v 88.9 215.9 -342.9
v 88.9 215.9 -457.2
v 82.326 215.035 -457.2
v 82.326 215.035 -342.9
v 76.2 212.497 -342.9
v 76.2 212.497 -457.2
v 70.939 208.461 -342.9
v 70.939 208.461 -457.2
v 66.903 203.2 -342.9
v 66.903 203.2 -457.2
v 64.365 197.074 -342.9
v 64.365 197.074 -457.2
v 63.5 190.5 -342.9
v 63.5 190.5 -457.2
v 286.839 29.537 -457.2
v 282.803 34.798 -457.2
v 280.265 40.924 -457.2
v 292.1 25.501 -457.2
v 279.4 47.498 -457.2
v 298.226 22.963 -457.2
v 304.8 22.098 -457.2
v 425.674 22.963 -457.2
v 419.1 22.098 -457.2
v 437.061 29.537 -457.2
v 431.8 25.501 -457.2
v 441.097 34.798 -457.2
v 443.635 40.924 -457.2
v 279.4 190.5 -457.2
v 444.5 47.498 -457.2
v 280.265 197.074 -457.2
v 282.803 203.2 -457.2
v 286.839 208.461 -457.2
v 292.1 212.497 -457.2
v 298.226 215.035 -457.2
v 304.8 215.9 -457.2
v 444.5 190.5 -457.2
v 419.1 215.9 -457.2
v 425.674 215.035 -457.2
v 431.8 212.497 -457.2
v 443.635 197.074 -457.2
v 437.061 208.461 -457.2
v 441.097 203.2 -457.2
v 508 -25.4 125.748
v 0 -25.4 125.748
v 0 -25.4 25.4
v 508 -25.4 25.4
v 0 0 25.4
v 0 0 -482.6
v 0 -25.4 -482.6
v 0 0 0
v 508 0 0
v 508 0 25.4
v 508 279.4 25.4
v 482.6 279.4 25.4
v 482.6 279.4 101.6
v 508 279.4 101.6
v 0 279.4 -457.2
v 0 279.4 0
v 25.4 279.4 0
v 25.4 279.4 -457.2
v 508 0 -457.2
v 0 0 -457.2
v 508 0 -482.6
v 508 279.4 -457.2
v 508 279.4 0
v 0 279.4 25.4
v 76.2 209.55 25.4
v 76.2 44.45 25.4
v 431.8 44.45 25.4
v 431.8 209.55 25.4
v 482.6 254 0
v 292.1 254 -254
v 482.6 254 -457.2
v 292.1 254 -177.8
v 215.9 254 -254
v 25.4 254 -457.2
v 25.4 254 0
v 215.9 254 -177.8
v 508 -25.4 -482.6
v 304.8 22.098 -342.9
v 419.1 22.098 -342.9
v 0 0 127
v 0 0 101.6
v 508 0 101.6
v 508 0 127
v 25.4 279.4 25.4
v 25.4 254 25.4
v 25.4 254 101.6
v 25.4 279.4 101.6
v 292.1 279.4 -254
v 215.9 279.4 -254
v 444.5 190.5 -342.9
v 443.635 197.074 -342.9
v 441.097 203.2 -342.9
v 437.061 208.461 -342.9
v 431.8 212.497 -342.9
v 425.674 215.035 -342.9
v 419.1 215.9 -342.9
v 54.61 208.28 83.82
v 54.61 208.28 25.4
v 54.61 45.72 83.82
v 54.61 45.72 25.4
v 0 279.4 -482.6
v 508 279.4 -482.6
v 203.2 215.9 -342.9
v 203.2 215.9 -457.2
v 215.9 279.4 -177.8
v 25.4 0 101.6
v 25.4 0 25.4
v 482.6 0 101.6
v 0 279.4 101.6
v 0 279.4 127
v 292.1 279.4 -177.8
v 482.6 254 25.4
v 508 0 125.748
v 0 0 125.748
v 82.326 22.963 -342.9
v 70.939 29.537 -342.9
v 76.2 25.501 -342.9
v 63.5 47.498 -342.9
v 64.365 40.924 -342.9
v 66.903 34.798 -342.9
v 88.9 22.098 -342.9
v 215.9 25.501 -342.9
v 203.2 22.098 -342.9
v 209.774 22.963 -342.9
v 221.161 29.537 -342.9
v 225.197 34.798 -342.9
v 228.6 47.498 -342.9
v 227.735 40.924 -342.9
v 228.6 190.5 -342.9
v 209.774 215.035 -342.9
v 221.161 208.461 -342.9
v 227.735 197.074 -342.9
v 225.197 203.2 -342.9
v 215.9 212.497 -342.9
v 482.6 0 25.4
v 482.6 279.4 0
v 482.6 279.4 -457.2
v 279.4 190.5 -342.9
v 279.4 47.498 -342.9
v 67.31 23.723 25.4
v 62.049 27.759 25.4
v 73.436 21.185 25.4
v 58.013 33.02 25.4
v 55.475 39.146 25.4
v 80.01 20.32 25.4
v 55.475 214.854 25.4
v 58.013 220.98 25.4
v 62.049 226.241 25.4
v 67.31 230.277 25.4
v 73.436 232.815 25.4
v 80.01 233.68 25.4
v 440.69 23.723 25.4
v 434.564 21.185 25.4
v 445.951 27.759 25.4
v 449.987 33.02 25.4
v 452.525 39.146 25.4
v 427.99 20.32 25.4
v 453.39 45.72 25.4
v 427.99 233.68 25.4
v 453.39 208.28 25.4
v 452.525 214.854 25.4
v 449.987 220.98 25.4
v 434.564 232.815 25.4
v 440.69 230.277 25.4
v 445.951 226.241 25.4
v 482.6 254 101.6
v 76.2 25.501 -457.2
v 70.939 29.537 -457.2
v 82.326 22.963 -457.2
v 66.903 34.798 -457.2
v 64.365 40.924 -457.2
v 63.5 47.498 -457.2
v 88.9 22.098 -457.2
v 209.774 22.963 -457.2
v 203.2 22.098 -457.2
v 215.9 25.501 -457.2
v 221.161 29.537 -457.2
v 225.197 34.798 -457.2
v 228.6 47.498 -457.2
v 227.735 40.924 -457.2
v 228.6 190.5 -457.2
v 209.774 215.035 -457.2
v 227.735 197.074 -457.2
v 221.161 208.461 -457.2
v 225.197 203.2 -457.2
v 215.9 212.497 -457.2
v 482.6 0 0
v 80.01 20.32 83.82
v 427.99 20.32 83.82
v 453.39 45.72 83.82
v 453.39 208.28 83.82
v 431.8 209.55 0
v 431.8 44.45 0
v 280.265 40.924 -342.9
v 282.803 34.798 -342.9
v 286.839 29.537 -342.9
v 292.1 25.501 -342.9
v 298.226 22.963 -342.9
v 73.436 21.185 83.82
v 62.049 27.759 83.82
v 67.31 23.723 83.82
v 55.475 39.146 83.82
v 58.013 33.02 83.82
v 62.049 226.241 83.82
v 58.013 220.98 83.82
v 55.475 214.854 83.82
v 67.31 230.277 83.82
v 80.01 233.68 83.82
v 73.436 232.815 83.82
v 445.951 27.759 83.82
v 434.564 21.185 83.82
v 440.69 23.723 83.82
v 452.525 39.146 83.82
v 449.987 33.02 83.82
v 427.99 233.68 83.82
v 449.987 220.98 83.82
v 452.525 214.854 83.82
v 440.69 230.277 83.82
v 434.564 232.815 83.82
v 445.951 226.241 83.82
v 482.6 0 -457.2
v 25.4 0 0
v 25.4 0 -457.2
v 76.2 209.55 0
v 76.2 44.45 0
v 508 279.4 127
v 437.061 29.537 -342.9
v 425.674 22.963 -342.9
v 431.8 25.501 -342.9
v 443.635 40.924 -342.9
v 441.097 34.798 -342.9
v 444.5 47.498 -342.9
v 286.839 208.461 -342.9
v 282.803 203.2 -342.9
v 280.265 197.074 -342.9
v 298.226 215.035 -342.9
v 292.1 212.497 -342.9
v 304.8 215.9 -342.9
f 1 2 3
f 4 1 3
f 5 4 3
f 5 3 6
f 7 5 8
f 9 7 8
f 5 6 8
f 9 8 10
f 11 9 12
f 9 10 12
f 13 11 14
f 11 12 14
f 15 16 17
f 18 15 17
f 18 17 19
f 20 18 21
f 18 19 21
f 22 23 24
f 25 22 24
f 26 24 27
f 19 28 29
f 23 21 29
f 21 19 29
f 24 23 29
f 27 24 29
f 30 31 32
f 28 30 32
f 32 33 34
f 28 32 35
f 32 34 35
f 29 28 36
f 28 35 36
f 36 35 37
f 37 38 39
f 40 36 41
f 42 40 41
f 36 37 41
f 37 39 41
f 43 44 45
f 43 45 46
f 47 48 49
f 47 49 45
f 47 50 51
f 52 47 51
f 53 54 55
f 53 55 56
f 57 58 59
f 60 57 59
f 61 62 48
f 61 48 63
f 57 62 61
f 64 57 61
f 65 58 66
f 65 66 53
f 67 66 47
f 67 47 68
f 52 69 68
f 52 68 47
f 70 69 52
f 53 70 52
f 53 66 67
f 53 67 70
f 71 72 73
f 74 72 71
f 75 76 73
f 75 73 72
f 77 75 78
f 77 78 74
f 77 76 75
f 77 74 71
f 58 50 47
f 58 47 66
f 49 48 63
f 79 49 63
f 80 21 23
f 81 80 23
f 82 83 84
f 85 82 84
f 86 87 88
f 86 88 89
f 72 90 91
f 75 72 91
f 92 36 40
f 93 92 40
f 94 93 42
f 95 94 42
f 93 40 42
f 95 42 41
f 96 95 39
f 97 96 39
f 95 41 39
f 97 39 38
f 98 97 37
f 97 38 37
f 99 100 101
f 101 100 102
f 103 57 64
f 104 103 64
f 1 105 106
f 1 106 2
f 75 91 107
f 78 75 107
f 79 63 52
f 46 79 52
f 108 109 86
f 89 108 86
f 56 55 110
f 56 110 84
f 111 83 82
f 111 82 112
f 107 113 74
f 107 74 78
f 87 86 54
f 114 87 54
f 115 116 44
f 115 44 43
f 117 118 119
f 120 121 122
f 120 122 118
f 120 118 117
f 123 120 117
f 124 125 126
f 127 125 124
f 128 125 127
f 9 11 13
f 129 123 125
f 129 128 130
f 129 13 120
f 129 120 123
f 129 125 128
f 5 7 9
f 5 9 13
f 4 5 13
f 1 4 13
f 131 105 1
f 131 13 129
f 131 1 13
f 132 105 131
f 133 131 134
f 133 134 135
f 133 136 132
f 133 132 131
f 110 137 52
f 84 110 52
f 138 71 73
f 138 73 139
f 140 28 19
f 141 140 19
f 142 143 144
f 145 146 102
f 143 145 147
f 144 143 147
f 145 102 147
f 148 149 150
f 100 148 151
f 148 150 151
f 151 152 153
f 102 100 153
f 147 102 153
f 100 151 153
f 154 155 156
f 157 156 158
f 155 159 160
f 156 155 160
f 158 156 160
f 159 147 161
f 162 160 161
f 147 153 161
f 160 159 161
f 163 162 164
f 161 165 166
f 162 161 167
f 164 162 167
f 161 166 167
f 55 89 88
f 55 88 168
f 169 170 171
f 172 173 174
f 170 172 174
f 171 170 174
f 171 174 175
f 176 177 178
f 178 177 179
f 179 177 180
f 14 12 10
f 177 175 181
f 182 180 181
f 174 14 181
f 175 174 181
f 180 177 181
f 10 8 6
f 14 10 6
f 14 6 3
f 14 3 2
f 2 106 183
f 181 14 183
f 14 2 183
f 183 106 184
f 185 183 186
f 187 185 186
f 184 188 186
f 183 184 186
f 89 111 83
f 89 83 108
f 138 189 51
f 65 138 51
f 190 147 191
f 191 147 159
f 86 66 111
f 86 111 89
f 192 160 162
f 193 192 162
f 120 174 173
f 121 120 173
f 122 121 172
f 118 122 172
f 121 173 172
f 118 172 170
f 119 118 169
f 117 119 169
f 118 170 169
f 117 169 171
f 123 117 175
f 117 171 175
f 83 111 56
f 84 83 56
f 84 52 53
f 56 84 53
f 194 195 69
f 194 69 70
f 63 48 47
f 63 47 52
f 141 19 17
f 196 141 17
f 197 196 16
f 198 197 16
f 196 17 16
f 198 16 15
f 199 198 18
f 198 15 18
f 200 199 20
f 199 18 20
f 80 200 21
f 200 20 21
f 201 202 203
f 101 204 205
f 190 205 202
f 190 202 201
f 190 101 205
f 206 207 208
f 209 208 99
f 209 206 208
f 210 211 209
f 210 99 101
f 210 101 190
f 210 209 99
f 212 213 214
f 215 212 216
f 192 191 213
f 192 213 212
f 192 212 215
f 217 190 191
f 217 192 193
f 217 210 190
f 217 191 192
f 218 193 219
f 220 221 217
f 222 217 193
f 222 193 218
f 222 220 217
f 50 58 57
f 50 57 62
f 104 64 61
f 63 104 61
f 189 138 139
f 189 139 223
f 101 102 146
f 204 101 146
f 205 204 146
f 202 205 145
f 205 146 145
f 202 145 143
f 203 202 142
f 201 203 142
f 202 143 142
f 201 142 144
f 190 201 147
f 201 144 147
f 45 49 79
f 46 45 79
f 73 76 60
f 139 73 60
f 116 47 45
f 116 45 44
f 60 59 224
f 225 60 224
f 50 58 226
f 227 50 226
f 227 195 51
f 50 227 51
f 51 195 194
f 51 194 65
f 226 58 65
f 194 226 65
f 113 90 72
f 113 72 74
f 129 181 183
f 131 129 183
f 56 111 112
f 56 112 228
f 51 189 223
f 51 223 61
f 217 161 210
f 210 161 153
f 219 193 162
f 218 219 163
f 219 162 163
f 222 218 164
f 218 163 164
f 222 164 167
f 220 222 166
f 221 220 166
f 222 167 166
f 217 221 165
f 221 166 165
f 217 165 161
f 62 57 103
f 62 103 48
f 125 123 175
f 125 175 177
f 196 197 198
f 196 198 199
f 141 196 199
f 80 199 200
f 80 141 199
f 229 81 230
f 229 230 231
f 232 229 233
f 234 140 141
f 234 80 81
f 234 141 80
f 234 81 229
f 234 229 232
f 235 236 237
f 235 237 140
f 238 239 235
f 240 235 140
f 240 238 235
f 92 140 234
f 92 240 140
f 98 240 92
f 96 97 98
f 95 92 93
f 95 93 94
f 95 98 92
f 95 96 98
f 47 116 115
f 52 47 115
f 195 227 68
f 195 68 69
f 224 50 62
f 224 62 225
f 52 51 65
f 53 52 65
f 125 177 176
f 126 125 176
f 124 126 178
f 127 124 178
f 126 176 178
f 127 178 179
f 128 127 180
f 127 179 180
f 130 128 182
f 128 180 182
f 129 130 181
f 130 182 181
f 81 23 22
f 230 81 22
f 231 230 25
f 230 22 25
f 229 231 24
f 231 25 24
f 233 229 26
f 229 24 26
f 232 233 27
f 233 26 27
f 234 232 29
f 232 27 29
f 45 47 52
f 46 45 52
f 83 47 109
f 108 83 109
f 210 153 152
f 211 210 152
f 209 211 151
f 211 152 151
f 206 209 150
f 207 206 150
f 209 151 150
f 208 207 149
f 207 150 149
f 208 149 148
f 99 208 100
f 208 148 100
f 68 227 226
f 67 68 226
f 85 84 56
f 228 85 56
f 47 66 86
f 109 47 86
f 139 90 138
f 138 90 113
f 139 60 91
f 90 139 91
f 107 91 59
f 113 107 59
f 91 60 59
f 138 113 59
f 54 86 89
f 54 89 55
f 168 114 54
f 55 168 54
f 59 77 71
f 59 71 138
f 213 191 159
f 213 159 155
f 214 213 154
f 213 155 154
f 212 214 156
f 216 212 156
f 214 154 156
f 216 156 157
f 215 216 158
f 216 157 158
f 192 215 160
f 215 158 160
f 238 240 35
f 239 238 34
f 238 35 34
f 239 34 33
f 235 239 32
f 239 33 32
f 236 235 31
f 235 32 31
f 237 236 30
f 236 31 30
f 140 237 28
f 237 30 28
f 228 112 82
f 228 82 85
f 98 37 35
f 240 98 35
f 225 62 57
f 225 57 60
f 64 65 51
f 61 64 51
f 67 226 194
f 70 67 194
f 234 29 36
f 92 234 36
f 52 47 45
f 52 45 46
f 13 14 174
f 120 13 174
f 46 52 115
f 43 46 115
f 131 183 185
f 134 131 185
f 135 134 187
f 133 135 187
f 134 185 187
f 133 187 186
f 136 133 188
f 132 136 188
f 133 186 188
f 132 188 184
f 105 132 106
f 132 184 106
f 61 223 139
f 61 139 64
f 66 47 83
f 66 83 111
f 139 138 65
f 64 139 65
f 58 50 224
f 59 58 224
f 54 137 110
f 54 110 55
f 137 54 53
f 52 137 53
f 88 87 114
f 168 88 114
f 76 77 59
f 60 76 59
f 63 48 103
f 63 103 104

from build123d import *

# Parameters (mm, degrees)
F0_W      = 508
F0_H      = 279.4
F0_W_2    = 355.6
F0_H_2    = 165.1
F1_DEPTH  = 25.4
F2_W      = 25.4
F2_H      = 279.4
F3_DEPTH  = 76.2
F4_W      = 25.4
F4_H      = 279.4
F5_DEPTH  = 76.2
F6_W      = 457.2
F6_H      = 25.4
F7_DEPTH  = 76.2
F9_DEPTH  = 58.42
F10_W     = 508
F10_H     = 279.4
F11_DEPTH = 25.4
F12_W     = 25.4
F12_H     = 279.4
F13_DEPTH = 457.2
F14_W     = 25.4
F14_H     = 279.4
F15_DEPTH = 457.2
F16_W     = 508
F16_H     = 279.4
F17_DEPTH = 25.4
F18_W     = 25.4
F18_H     = 457.2
F19_DEPTH = 457.2
F20_W     = 508
F20_H     = 508
F21_DEPTH = 25.4
F22_W     = 508
F22_H     = 100.347652
F23_DEPTH = 25.4
F24_W     = 76.2
F24_H     = 76.2
F25_DEPTH = 25.4
F27_DEPTH = 114.3


with BuildPart() as f1:
    # F0 (on Top) → F1 (new body)
    with BuildSketch(Plane.XY):
        with Locations((254, 139.7)):
            Rectangle(F0_W, F0_H)
        with Locations((254, 127)):
            Rectangle(F0_W_2, F0_H_2, mode=Mode.SUBTRACT)
    extrude(amount=F1_DEPTH)


with BuildPart() as f3:
    # F2 (on face) → F3 (new body)
    with BuildSketch(Plane.XY.offset(25.4)):
        with Locations((12.7, 139.7)):
            Rectangle(F2_W, F2_H)
    extrude(amount=F3_DEPTH)


with BuildPart() as f5:
    # F4 (on face) → F5 (new body)
    with BuildSketch(Plane.XY.offset(25.4)):
        with Locations((495.3, 139.7)):
            Rectangle(F4_W, F4_H)
    extrude(amount=F5_DEPTH)


with BuildPart() as f7:
    # F6 (on face) → F7 (new body)
    with BuildSketch(Plane.XY.offset(25.4)):
        with Locations((254, 266.7)):
            Rectangle(F6_W, F6_H)
    extrude(amount=F7_DEPTH)


with BuildPart() as f9:
    # F8 (on face) → F9 (new body)
    with BuildSketch(Plane.XY.offset(25.4)):
        with BuildLine():
            Line((427.99, 233.68), (80.01, 233.68))
            ThreePointArc((80.01, 233.68), (62.049488, 226.240512), (54.61, 208.28))
            Line((54.61, 208.28), (54.61, 45.72))
            ThreePointArc((54.61, 45.72), (62.049488, 27.759488), (80.01, 20.32))
            Line((80.01, 20.32), (427.99, 20.32))
            ThreePointArc((427.99, 20.32), (445.950512, 27.759488), (453.39, 45.72))
            Line((453.39, 45.72), (453.39, 208.28))
            ThreePointArc((453.39, 208.28), (445.950512, 226.240512), (427.99, 233.68))
        make_face()
    extrude(amount=F9_DEPTH)


with BuildPart() as f11:
    # F10 (on face) → F11 (new body)
    with BuildSketch(Plane.XY.offset(101.6)):
        with Locations((254, 139.7)):
            Rectangle(F10_W, F10_H)
    extrude(amount=F11_DEPTH)


with BuildPart() as f13:
    # F12 (on face) → F13 (new body)
    with BuildSketch(Plane(origin=(0, 0, 0), x_dir=(1, 0, 0), z_dir=(0, 0, -1))):
        with Locations((12.7, -139.7)):
            Rectangle(F12_W, F12_H)
    extrude(amount=F13_DEPTH)


with BuildPart() as f15:
    # F14 (on face) → F15 (new body)
    with BuildSketch(Plane(origin=(0, 0, 0), x_dir=(1, 0, 0), z_dir=(0, 0, -1))):
        with Locations((495.3, -139.7)):
            Rectangle(F14_W, F14_H)
    extrude(amount=F15_DEPTH)


with BuildPart() as f17:
    # F16 (on face) → F17 (new body)
    with BuildSketch(Plane(origin=(0, 0, -457.2), x_dir=(1, 0, 0), z_dir=(0, 0, -1))):
        with Locations((254, -139.7)):
            Rectangle(F16_W, F16_H)
    extrude(amount=F17_DEPTH)


with BuildPart() as f19:
    # F18 (on face) → F19 (new body)
    with BuildSketch(Plane.YZ.offset(25.4)):
        with Locations((266.7, -228.6)):
            Rectangle(F18_W, F18_H)
    extrude(amount=F19_DEPTH)

    # F24 (on face) → F25 (cut, through all)
    with BuildSketch(Plane(origin=(0, 279.4, 0), x_dir=(-1, 0, 0), z_dir=(0, 1, 0))):
        with Locations((-254, -215.9)):
            Rectangle(F24_W, F24_H)
    extrude(amount=-F25_DEPTH, mode=Mode.SUBTRACT)


with BuildPart() as f21:
    # F20 (on face) → F21 (new body)
    with BuildSketch(Plane.XZ):
        with Locations((254, -228.6)):
            Rectangle(F20_W, F20_H)
    extrude(amount=F21_DEPTH)


with BuildPart() as f23:
    # F22 (on face) → F23 (new body)
    with BuildSketch(Plane.XZ):
        with Locations((254, 75.573826)):
            Rectangle(F22_W, F22_H)
    extrude(amount=F23_DEPTH)


with BuildPart() as f27:
    # F26 (on face) → F27 (new body)
    with BuildSketch(Plane.XY.offset(-457.2)):
        with BuildLine():
            ThreePointArc((63.5, 47.498), (70.939488, 29.537488), (88.9, 22.098))
            Line((88.9, 22.098), (203.2, 22.098))
            ThreePointArc((203.2, 22.098), (221.160512, 29.537488), (228.6, 47.498))
            Line((228.6, 47.498), (228.6, 190.5))
            ThreePointArc((228.6, 190.5), (221.160512, 208.460512), (203.2, 215.9))
            Line((203.2, 215.9), (88.9, 215.9))
            ThreePointArc((88.9, 215.9), (70.939488, 208.460512), (63.5, 190.5))
            Line((63.5, 190.5), (63.5, 47.498))
        make_face()
        with BuildLine():
            ThreePointArc((444.5, 190.5), (437.060512, 208.460512), (419.1, 215.9))
            Line((419.1, 215.9), (304.8, 215.9))
            ThreePointArc((304.8, 215.9), (286.839488, 208.460512), (279.4, 190.5))
            Line((279.4, 190.5), (279.4, 47.498))
            ThreePointArc((279.4, 47.498), (286.839488, 29.537488), (304.8, 22.098))
            Line((304.8, 22.098), (419.1, 22.098))
            ThreePointArc((419.1, 22.098), (437.060512, 29.537488), (444.5, 47.498))
            Line((444.5, 47.498), (444.5, 190.5))
        make_face()
    extrude(amount=F27_DEPTH)


solid = Compound([f1.part, f3.part, f5.part, f7.part, f9.part, f11.part, f13.part, f15.part, f17.part, f19.part, f21.part, f23.part, f27.part])
